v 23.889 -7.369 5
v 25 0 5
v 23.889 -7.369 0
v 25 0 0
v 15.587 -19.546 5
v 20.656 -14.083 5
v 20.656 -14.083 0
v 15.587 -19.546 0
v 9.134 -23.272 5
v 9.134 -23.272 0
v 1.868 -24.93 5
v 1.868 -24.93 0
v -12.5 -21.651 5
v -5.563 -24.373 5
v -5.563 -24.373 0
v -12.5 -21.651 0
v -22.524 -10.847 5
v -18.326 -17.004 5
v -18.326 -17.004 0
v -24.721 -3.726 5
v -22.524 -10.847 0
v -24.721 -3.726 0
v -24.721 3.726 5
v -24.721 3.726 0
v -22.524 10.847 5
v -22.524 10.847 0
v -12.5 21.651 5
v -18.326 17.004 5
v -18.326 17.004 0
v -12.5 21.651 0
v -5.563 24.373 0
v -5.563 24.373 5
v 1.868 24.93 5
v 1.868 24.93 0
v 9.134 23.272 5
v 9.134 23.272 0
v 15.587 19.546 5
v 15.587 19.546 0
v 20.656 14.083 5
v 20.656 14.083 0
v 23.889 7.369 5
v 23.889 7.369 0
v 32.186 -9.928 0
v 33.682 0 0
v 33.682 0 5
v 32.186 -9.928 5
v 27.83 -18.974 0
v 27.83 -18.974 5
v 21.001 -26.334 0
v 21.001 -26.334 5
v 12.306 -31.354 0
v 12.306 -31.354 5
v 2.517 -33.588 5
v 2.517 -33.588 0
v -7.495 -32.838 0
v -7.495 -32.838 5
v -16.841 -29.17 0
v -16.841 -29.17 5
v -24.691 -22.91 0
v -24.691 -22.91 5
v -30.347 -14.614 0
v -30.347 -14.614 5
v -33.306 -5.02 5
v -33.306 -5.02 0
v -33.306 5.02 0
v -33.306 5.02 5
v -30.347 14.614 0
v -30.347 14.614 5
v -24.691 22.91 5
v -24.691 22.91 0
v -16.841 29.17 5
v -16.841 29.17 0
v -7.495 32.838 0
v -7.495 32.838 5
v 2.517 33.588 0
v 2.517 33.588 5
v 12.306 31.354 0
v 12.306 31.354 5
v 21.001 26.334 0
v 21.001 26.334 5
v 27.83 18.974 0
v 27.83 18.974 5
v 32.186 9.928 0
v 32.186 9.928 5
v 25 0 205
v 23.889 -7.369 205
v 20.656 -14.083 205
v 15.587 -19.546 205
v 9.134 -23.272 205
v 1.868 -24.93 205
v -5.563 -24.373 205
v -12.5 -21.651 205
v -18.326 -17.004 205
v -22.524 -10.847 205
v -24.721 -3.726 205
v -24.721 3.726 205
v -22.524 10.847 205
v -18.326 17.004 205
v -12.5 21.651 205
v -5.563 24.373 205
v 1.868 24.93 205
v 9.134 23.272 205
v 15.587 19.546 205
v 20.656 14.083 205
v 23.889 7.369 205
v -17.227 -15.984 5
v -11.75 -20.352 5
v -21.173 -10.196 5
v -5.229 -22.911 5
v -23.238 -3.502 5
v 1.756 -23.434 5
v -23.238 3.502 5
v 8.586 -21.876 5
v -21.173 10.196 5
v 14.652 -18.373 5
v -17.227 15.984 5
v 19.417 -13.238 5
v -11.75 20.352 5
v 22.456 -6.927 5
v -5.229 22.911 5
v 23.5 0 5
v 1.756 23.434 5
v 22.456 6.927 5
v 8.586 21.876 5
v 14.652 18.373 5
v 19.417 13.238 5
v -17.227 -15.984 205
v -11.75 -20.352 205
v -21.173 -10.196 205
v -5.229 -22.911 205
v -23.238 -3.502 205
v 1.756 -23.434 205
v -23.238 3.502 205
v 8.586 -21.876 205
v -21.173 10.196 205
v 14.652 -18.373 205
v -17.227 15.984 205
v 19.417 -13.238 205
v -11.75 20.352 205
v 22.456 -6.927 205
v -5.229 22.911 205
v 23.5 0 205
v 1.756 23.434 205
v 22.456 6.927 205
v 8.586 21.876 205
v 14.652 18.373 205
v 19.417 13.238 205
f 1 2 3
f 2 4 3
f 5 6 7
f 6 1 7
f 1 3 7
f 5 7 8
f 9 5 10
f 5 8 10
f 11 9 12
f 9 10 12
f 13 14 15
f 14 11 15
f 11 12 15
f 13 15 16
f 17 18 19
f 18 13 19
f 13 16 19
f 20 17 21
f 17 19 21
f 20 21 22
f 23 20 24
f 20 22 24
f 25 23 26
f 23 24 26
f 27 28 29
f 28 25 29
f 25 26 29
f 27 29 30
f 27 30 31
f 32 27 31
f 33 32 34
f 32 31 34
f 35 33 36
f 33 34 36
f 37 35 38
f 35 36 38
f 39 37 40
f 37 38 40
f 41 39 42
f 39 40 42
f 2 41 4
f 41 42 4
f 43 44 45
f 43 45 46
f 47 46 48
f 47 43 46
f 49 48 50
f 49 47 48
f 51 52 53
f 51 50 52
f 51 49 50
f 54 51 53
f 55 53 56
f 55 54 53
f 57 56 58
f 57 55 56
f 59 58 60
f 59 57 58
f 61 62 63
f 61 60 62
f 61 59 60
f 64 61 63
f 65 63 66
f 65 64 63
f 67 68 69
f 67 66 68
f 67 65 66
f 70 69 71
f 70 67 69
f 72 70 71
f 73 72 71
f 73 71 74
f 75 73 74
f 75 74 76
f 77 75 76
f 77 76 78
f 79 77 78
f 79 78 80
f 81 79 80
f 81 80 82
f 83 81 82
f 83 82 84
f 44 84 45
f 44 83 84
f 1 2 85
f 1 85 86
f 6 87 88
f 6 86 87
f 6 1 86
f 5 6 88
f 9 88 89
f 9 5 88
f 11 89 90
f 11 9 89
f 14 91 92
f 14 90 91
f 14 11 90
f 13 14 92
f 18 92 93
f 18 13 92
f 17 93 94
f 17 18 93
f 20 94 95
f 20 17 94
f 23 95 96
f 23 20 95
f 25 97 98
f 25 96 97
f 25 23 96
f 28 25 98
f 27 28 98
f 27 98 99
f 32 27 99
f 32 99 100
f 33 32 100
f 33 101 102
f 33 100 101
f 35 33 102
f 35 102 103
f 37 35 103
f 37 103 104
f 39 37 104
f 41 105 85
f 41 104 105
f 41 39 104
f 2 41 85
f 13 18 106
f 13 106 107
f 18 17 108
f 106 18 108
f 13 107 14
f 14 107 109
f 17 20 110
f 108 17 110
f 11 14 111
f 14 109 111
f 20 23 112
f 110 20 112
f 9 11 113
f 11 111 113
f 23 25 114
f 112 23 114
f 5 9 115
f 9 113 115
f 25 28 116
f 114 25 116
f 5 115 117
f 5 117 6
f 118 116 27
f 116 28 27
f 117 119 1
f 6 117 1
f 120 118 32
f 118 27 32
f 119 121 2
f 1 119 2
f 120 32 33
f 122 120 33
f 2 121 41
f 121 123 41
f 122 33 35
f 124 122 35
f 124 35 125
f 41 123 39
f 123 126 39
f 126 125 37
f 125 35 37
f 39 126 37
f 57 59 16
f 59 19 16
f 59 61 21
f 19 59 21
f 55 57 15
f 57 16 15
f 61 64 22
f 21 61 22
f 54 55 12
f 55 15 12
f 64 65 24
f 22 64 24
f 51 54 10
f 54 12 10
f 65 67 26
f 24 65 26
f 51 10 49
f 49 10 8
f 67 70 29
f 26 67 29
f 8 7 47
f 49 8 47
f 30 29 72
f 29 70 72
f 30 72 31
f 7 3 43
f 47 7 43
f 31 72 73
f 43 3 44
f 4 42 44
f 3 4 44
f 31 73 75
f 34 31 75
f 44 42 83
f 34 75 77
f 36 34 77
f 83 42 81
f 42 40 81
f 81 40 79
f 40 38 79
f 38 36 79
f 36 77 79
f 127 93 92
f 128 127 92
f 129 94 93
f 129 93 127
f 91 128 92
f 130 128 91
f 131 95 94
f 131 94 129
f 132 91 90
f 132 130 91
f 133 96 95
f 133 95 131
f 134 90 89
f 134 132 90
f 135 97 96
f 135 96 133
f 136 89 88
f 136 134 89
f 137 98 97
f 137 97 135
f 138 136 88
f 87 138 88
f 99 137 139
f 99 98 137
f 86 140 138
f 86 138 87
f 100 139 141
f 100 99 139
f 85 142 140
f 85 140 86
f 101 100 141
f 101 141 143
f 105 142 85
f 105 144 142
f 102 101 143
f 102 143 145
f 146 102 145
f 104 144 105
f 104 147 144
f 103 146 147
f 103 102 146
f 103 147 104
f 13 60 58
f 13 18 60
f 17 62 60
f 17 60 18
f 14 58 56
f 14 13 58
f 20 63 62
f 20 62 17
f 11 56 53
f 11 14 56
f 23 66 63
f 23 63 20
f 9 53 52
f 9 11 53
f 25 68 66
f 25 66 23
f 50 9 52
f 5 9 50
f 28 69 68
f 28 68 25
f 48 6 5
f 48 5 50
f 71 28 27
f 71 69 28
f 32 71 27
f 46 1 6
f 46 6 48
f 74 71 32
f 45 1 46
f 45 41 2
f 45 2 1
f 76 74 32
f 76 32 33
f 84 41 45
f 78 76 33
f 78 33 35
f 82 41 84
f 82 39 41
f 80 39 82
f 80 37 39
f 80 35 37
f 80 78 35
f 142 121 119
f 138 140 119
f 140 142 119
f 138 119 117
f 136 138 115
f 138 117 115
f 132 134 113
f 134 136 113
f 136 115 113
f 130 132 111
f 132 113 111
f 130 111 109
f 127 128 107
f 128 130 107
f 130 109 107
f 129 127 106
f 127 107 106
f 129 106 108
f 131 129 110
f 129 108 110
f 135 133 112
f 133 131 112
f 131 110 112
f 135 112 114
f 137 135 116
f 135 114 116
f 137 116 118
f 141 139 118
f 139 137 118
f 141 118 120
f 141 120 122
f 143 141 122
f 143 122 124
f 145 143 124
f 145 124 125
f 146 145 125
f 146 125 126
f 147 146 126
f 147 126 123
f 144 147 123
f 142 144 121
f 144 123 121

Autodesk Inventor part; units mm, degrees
ref_plane "YZ Plane" through (0, 0, 0) normal (1, 0, 0) x (0, 1, 0)
ref_plane "XZ Plane" through (0, 0, 0) normal (0, 1, 0) x (-1, 0, 0)
ref_plane "XY Plane" through (0, 0, 0) normal (0, 0, 1) x (1, 0, 0)
sketch "Sketch1" plane through (0, 0, 0) normal (0, 0, 1) x (1, 0, 0)
  circle A0 centre (0, 0) radius 33.6825
  circle A1 centre (0, 0) radius 25
  dimension "d0" = 67.365
  dimension "d1" = 50
extrude "Extrusion1" add sketch "Sketch1" along normal blind 5
sketch "Sketch2" plane through (0, 0, 5) normal (0, 0, 1) x (1, 0, 0)
  circle A0 centre (0, 0) radius 25
  circle A1 centre (0, 0) radius 23.5
  dimension "d4" = 47
extrude "Extrusion2" add sketch "Sketch2" along normal blind 200
properties part number "UR5 End to wrist" material "Aluminum 6061-AHC"
